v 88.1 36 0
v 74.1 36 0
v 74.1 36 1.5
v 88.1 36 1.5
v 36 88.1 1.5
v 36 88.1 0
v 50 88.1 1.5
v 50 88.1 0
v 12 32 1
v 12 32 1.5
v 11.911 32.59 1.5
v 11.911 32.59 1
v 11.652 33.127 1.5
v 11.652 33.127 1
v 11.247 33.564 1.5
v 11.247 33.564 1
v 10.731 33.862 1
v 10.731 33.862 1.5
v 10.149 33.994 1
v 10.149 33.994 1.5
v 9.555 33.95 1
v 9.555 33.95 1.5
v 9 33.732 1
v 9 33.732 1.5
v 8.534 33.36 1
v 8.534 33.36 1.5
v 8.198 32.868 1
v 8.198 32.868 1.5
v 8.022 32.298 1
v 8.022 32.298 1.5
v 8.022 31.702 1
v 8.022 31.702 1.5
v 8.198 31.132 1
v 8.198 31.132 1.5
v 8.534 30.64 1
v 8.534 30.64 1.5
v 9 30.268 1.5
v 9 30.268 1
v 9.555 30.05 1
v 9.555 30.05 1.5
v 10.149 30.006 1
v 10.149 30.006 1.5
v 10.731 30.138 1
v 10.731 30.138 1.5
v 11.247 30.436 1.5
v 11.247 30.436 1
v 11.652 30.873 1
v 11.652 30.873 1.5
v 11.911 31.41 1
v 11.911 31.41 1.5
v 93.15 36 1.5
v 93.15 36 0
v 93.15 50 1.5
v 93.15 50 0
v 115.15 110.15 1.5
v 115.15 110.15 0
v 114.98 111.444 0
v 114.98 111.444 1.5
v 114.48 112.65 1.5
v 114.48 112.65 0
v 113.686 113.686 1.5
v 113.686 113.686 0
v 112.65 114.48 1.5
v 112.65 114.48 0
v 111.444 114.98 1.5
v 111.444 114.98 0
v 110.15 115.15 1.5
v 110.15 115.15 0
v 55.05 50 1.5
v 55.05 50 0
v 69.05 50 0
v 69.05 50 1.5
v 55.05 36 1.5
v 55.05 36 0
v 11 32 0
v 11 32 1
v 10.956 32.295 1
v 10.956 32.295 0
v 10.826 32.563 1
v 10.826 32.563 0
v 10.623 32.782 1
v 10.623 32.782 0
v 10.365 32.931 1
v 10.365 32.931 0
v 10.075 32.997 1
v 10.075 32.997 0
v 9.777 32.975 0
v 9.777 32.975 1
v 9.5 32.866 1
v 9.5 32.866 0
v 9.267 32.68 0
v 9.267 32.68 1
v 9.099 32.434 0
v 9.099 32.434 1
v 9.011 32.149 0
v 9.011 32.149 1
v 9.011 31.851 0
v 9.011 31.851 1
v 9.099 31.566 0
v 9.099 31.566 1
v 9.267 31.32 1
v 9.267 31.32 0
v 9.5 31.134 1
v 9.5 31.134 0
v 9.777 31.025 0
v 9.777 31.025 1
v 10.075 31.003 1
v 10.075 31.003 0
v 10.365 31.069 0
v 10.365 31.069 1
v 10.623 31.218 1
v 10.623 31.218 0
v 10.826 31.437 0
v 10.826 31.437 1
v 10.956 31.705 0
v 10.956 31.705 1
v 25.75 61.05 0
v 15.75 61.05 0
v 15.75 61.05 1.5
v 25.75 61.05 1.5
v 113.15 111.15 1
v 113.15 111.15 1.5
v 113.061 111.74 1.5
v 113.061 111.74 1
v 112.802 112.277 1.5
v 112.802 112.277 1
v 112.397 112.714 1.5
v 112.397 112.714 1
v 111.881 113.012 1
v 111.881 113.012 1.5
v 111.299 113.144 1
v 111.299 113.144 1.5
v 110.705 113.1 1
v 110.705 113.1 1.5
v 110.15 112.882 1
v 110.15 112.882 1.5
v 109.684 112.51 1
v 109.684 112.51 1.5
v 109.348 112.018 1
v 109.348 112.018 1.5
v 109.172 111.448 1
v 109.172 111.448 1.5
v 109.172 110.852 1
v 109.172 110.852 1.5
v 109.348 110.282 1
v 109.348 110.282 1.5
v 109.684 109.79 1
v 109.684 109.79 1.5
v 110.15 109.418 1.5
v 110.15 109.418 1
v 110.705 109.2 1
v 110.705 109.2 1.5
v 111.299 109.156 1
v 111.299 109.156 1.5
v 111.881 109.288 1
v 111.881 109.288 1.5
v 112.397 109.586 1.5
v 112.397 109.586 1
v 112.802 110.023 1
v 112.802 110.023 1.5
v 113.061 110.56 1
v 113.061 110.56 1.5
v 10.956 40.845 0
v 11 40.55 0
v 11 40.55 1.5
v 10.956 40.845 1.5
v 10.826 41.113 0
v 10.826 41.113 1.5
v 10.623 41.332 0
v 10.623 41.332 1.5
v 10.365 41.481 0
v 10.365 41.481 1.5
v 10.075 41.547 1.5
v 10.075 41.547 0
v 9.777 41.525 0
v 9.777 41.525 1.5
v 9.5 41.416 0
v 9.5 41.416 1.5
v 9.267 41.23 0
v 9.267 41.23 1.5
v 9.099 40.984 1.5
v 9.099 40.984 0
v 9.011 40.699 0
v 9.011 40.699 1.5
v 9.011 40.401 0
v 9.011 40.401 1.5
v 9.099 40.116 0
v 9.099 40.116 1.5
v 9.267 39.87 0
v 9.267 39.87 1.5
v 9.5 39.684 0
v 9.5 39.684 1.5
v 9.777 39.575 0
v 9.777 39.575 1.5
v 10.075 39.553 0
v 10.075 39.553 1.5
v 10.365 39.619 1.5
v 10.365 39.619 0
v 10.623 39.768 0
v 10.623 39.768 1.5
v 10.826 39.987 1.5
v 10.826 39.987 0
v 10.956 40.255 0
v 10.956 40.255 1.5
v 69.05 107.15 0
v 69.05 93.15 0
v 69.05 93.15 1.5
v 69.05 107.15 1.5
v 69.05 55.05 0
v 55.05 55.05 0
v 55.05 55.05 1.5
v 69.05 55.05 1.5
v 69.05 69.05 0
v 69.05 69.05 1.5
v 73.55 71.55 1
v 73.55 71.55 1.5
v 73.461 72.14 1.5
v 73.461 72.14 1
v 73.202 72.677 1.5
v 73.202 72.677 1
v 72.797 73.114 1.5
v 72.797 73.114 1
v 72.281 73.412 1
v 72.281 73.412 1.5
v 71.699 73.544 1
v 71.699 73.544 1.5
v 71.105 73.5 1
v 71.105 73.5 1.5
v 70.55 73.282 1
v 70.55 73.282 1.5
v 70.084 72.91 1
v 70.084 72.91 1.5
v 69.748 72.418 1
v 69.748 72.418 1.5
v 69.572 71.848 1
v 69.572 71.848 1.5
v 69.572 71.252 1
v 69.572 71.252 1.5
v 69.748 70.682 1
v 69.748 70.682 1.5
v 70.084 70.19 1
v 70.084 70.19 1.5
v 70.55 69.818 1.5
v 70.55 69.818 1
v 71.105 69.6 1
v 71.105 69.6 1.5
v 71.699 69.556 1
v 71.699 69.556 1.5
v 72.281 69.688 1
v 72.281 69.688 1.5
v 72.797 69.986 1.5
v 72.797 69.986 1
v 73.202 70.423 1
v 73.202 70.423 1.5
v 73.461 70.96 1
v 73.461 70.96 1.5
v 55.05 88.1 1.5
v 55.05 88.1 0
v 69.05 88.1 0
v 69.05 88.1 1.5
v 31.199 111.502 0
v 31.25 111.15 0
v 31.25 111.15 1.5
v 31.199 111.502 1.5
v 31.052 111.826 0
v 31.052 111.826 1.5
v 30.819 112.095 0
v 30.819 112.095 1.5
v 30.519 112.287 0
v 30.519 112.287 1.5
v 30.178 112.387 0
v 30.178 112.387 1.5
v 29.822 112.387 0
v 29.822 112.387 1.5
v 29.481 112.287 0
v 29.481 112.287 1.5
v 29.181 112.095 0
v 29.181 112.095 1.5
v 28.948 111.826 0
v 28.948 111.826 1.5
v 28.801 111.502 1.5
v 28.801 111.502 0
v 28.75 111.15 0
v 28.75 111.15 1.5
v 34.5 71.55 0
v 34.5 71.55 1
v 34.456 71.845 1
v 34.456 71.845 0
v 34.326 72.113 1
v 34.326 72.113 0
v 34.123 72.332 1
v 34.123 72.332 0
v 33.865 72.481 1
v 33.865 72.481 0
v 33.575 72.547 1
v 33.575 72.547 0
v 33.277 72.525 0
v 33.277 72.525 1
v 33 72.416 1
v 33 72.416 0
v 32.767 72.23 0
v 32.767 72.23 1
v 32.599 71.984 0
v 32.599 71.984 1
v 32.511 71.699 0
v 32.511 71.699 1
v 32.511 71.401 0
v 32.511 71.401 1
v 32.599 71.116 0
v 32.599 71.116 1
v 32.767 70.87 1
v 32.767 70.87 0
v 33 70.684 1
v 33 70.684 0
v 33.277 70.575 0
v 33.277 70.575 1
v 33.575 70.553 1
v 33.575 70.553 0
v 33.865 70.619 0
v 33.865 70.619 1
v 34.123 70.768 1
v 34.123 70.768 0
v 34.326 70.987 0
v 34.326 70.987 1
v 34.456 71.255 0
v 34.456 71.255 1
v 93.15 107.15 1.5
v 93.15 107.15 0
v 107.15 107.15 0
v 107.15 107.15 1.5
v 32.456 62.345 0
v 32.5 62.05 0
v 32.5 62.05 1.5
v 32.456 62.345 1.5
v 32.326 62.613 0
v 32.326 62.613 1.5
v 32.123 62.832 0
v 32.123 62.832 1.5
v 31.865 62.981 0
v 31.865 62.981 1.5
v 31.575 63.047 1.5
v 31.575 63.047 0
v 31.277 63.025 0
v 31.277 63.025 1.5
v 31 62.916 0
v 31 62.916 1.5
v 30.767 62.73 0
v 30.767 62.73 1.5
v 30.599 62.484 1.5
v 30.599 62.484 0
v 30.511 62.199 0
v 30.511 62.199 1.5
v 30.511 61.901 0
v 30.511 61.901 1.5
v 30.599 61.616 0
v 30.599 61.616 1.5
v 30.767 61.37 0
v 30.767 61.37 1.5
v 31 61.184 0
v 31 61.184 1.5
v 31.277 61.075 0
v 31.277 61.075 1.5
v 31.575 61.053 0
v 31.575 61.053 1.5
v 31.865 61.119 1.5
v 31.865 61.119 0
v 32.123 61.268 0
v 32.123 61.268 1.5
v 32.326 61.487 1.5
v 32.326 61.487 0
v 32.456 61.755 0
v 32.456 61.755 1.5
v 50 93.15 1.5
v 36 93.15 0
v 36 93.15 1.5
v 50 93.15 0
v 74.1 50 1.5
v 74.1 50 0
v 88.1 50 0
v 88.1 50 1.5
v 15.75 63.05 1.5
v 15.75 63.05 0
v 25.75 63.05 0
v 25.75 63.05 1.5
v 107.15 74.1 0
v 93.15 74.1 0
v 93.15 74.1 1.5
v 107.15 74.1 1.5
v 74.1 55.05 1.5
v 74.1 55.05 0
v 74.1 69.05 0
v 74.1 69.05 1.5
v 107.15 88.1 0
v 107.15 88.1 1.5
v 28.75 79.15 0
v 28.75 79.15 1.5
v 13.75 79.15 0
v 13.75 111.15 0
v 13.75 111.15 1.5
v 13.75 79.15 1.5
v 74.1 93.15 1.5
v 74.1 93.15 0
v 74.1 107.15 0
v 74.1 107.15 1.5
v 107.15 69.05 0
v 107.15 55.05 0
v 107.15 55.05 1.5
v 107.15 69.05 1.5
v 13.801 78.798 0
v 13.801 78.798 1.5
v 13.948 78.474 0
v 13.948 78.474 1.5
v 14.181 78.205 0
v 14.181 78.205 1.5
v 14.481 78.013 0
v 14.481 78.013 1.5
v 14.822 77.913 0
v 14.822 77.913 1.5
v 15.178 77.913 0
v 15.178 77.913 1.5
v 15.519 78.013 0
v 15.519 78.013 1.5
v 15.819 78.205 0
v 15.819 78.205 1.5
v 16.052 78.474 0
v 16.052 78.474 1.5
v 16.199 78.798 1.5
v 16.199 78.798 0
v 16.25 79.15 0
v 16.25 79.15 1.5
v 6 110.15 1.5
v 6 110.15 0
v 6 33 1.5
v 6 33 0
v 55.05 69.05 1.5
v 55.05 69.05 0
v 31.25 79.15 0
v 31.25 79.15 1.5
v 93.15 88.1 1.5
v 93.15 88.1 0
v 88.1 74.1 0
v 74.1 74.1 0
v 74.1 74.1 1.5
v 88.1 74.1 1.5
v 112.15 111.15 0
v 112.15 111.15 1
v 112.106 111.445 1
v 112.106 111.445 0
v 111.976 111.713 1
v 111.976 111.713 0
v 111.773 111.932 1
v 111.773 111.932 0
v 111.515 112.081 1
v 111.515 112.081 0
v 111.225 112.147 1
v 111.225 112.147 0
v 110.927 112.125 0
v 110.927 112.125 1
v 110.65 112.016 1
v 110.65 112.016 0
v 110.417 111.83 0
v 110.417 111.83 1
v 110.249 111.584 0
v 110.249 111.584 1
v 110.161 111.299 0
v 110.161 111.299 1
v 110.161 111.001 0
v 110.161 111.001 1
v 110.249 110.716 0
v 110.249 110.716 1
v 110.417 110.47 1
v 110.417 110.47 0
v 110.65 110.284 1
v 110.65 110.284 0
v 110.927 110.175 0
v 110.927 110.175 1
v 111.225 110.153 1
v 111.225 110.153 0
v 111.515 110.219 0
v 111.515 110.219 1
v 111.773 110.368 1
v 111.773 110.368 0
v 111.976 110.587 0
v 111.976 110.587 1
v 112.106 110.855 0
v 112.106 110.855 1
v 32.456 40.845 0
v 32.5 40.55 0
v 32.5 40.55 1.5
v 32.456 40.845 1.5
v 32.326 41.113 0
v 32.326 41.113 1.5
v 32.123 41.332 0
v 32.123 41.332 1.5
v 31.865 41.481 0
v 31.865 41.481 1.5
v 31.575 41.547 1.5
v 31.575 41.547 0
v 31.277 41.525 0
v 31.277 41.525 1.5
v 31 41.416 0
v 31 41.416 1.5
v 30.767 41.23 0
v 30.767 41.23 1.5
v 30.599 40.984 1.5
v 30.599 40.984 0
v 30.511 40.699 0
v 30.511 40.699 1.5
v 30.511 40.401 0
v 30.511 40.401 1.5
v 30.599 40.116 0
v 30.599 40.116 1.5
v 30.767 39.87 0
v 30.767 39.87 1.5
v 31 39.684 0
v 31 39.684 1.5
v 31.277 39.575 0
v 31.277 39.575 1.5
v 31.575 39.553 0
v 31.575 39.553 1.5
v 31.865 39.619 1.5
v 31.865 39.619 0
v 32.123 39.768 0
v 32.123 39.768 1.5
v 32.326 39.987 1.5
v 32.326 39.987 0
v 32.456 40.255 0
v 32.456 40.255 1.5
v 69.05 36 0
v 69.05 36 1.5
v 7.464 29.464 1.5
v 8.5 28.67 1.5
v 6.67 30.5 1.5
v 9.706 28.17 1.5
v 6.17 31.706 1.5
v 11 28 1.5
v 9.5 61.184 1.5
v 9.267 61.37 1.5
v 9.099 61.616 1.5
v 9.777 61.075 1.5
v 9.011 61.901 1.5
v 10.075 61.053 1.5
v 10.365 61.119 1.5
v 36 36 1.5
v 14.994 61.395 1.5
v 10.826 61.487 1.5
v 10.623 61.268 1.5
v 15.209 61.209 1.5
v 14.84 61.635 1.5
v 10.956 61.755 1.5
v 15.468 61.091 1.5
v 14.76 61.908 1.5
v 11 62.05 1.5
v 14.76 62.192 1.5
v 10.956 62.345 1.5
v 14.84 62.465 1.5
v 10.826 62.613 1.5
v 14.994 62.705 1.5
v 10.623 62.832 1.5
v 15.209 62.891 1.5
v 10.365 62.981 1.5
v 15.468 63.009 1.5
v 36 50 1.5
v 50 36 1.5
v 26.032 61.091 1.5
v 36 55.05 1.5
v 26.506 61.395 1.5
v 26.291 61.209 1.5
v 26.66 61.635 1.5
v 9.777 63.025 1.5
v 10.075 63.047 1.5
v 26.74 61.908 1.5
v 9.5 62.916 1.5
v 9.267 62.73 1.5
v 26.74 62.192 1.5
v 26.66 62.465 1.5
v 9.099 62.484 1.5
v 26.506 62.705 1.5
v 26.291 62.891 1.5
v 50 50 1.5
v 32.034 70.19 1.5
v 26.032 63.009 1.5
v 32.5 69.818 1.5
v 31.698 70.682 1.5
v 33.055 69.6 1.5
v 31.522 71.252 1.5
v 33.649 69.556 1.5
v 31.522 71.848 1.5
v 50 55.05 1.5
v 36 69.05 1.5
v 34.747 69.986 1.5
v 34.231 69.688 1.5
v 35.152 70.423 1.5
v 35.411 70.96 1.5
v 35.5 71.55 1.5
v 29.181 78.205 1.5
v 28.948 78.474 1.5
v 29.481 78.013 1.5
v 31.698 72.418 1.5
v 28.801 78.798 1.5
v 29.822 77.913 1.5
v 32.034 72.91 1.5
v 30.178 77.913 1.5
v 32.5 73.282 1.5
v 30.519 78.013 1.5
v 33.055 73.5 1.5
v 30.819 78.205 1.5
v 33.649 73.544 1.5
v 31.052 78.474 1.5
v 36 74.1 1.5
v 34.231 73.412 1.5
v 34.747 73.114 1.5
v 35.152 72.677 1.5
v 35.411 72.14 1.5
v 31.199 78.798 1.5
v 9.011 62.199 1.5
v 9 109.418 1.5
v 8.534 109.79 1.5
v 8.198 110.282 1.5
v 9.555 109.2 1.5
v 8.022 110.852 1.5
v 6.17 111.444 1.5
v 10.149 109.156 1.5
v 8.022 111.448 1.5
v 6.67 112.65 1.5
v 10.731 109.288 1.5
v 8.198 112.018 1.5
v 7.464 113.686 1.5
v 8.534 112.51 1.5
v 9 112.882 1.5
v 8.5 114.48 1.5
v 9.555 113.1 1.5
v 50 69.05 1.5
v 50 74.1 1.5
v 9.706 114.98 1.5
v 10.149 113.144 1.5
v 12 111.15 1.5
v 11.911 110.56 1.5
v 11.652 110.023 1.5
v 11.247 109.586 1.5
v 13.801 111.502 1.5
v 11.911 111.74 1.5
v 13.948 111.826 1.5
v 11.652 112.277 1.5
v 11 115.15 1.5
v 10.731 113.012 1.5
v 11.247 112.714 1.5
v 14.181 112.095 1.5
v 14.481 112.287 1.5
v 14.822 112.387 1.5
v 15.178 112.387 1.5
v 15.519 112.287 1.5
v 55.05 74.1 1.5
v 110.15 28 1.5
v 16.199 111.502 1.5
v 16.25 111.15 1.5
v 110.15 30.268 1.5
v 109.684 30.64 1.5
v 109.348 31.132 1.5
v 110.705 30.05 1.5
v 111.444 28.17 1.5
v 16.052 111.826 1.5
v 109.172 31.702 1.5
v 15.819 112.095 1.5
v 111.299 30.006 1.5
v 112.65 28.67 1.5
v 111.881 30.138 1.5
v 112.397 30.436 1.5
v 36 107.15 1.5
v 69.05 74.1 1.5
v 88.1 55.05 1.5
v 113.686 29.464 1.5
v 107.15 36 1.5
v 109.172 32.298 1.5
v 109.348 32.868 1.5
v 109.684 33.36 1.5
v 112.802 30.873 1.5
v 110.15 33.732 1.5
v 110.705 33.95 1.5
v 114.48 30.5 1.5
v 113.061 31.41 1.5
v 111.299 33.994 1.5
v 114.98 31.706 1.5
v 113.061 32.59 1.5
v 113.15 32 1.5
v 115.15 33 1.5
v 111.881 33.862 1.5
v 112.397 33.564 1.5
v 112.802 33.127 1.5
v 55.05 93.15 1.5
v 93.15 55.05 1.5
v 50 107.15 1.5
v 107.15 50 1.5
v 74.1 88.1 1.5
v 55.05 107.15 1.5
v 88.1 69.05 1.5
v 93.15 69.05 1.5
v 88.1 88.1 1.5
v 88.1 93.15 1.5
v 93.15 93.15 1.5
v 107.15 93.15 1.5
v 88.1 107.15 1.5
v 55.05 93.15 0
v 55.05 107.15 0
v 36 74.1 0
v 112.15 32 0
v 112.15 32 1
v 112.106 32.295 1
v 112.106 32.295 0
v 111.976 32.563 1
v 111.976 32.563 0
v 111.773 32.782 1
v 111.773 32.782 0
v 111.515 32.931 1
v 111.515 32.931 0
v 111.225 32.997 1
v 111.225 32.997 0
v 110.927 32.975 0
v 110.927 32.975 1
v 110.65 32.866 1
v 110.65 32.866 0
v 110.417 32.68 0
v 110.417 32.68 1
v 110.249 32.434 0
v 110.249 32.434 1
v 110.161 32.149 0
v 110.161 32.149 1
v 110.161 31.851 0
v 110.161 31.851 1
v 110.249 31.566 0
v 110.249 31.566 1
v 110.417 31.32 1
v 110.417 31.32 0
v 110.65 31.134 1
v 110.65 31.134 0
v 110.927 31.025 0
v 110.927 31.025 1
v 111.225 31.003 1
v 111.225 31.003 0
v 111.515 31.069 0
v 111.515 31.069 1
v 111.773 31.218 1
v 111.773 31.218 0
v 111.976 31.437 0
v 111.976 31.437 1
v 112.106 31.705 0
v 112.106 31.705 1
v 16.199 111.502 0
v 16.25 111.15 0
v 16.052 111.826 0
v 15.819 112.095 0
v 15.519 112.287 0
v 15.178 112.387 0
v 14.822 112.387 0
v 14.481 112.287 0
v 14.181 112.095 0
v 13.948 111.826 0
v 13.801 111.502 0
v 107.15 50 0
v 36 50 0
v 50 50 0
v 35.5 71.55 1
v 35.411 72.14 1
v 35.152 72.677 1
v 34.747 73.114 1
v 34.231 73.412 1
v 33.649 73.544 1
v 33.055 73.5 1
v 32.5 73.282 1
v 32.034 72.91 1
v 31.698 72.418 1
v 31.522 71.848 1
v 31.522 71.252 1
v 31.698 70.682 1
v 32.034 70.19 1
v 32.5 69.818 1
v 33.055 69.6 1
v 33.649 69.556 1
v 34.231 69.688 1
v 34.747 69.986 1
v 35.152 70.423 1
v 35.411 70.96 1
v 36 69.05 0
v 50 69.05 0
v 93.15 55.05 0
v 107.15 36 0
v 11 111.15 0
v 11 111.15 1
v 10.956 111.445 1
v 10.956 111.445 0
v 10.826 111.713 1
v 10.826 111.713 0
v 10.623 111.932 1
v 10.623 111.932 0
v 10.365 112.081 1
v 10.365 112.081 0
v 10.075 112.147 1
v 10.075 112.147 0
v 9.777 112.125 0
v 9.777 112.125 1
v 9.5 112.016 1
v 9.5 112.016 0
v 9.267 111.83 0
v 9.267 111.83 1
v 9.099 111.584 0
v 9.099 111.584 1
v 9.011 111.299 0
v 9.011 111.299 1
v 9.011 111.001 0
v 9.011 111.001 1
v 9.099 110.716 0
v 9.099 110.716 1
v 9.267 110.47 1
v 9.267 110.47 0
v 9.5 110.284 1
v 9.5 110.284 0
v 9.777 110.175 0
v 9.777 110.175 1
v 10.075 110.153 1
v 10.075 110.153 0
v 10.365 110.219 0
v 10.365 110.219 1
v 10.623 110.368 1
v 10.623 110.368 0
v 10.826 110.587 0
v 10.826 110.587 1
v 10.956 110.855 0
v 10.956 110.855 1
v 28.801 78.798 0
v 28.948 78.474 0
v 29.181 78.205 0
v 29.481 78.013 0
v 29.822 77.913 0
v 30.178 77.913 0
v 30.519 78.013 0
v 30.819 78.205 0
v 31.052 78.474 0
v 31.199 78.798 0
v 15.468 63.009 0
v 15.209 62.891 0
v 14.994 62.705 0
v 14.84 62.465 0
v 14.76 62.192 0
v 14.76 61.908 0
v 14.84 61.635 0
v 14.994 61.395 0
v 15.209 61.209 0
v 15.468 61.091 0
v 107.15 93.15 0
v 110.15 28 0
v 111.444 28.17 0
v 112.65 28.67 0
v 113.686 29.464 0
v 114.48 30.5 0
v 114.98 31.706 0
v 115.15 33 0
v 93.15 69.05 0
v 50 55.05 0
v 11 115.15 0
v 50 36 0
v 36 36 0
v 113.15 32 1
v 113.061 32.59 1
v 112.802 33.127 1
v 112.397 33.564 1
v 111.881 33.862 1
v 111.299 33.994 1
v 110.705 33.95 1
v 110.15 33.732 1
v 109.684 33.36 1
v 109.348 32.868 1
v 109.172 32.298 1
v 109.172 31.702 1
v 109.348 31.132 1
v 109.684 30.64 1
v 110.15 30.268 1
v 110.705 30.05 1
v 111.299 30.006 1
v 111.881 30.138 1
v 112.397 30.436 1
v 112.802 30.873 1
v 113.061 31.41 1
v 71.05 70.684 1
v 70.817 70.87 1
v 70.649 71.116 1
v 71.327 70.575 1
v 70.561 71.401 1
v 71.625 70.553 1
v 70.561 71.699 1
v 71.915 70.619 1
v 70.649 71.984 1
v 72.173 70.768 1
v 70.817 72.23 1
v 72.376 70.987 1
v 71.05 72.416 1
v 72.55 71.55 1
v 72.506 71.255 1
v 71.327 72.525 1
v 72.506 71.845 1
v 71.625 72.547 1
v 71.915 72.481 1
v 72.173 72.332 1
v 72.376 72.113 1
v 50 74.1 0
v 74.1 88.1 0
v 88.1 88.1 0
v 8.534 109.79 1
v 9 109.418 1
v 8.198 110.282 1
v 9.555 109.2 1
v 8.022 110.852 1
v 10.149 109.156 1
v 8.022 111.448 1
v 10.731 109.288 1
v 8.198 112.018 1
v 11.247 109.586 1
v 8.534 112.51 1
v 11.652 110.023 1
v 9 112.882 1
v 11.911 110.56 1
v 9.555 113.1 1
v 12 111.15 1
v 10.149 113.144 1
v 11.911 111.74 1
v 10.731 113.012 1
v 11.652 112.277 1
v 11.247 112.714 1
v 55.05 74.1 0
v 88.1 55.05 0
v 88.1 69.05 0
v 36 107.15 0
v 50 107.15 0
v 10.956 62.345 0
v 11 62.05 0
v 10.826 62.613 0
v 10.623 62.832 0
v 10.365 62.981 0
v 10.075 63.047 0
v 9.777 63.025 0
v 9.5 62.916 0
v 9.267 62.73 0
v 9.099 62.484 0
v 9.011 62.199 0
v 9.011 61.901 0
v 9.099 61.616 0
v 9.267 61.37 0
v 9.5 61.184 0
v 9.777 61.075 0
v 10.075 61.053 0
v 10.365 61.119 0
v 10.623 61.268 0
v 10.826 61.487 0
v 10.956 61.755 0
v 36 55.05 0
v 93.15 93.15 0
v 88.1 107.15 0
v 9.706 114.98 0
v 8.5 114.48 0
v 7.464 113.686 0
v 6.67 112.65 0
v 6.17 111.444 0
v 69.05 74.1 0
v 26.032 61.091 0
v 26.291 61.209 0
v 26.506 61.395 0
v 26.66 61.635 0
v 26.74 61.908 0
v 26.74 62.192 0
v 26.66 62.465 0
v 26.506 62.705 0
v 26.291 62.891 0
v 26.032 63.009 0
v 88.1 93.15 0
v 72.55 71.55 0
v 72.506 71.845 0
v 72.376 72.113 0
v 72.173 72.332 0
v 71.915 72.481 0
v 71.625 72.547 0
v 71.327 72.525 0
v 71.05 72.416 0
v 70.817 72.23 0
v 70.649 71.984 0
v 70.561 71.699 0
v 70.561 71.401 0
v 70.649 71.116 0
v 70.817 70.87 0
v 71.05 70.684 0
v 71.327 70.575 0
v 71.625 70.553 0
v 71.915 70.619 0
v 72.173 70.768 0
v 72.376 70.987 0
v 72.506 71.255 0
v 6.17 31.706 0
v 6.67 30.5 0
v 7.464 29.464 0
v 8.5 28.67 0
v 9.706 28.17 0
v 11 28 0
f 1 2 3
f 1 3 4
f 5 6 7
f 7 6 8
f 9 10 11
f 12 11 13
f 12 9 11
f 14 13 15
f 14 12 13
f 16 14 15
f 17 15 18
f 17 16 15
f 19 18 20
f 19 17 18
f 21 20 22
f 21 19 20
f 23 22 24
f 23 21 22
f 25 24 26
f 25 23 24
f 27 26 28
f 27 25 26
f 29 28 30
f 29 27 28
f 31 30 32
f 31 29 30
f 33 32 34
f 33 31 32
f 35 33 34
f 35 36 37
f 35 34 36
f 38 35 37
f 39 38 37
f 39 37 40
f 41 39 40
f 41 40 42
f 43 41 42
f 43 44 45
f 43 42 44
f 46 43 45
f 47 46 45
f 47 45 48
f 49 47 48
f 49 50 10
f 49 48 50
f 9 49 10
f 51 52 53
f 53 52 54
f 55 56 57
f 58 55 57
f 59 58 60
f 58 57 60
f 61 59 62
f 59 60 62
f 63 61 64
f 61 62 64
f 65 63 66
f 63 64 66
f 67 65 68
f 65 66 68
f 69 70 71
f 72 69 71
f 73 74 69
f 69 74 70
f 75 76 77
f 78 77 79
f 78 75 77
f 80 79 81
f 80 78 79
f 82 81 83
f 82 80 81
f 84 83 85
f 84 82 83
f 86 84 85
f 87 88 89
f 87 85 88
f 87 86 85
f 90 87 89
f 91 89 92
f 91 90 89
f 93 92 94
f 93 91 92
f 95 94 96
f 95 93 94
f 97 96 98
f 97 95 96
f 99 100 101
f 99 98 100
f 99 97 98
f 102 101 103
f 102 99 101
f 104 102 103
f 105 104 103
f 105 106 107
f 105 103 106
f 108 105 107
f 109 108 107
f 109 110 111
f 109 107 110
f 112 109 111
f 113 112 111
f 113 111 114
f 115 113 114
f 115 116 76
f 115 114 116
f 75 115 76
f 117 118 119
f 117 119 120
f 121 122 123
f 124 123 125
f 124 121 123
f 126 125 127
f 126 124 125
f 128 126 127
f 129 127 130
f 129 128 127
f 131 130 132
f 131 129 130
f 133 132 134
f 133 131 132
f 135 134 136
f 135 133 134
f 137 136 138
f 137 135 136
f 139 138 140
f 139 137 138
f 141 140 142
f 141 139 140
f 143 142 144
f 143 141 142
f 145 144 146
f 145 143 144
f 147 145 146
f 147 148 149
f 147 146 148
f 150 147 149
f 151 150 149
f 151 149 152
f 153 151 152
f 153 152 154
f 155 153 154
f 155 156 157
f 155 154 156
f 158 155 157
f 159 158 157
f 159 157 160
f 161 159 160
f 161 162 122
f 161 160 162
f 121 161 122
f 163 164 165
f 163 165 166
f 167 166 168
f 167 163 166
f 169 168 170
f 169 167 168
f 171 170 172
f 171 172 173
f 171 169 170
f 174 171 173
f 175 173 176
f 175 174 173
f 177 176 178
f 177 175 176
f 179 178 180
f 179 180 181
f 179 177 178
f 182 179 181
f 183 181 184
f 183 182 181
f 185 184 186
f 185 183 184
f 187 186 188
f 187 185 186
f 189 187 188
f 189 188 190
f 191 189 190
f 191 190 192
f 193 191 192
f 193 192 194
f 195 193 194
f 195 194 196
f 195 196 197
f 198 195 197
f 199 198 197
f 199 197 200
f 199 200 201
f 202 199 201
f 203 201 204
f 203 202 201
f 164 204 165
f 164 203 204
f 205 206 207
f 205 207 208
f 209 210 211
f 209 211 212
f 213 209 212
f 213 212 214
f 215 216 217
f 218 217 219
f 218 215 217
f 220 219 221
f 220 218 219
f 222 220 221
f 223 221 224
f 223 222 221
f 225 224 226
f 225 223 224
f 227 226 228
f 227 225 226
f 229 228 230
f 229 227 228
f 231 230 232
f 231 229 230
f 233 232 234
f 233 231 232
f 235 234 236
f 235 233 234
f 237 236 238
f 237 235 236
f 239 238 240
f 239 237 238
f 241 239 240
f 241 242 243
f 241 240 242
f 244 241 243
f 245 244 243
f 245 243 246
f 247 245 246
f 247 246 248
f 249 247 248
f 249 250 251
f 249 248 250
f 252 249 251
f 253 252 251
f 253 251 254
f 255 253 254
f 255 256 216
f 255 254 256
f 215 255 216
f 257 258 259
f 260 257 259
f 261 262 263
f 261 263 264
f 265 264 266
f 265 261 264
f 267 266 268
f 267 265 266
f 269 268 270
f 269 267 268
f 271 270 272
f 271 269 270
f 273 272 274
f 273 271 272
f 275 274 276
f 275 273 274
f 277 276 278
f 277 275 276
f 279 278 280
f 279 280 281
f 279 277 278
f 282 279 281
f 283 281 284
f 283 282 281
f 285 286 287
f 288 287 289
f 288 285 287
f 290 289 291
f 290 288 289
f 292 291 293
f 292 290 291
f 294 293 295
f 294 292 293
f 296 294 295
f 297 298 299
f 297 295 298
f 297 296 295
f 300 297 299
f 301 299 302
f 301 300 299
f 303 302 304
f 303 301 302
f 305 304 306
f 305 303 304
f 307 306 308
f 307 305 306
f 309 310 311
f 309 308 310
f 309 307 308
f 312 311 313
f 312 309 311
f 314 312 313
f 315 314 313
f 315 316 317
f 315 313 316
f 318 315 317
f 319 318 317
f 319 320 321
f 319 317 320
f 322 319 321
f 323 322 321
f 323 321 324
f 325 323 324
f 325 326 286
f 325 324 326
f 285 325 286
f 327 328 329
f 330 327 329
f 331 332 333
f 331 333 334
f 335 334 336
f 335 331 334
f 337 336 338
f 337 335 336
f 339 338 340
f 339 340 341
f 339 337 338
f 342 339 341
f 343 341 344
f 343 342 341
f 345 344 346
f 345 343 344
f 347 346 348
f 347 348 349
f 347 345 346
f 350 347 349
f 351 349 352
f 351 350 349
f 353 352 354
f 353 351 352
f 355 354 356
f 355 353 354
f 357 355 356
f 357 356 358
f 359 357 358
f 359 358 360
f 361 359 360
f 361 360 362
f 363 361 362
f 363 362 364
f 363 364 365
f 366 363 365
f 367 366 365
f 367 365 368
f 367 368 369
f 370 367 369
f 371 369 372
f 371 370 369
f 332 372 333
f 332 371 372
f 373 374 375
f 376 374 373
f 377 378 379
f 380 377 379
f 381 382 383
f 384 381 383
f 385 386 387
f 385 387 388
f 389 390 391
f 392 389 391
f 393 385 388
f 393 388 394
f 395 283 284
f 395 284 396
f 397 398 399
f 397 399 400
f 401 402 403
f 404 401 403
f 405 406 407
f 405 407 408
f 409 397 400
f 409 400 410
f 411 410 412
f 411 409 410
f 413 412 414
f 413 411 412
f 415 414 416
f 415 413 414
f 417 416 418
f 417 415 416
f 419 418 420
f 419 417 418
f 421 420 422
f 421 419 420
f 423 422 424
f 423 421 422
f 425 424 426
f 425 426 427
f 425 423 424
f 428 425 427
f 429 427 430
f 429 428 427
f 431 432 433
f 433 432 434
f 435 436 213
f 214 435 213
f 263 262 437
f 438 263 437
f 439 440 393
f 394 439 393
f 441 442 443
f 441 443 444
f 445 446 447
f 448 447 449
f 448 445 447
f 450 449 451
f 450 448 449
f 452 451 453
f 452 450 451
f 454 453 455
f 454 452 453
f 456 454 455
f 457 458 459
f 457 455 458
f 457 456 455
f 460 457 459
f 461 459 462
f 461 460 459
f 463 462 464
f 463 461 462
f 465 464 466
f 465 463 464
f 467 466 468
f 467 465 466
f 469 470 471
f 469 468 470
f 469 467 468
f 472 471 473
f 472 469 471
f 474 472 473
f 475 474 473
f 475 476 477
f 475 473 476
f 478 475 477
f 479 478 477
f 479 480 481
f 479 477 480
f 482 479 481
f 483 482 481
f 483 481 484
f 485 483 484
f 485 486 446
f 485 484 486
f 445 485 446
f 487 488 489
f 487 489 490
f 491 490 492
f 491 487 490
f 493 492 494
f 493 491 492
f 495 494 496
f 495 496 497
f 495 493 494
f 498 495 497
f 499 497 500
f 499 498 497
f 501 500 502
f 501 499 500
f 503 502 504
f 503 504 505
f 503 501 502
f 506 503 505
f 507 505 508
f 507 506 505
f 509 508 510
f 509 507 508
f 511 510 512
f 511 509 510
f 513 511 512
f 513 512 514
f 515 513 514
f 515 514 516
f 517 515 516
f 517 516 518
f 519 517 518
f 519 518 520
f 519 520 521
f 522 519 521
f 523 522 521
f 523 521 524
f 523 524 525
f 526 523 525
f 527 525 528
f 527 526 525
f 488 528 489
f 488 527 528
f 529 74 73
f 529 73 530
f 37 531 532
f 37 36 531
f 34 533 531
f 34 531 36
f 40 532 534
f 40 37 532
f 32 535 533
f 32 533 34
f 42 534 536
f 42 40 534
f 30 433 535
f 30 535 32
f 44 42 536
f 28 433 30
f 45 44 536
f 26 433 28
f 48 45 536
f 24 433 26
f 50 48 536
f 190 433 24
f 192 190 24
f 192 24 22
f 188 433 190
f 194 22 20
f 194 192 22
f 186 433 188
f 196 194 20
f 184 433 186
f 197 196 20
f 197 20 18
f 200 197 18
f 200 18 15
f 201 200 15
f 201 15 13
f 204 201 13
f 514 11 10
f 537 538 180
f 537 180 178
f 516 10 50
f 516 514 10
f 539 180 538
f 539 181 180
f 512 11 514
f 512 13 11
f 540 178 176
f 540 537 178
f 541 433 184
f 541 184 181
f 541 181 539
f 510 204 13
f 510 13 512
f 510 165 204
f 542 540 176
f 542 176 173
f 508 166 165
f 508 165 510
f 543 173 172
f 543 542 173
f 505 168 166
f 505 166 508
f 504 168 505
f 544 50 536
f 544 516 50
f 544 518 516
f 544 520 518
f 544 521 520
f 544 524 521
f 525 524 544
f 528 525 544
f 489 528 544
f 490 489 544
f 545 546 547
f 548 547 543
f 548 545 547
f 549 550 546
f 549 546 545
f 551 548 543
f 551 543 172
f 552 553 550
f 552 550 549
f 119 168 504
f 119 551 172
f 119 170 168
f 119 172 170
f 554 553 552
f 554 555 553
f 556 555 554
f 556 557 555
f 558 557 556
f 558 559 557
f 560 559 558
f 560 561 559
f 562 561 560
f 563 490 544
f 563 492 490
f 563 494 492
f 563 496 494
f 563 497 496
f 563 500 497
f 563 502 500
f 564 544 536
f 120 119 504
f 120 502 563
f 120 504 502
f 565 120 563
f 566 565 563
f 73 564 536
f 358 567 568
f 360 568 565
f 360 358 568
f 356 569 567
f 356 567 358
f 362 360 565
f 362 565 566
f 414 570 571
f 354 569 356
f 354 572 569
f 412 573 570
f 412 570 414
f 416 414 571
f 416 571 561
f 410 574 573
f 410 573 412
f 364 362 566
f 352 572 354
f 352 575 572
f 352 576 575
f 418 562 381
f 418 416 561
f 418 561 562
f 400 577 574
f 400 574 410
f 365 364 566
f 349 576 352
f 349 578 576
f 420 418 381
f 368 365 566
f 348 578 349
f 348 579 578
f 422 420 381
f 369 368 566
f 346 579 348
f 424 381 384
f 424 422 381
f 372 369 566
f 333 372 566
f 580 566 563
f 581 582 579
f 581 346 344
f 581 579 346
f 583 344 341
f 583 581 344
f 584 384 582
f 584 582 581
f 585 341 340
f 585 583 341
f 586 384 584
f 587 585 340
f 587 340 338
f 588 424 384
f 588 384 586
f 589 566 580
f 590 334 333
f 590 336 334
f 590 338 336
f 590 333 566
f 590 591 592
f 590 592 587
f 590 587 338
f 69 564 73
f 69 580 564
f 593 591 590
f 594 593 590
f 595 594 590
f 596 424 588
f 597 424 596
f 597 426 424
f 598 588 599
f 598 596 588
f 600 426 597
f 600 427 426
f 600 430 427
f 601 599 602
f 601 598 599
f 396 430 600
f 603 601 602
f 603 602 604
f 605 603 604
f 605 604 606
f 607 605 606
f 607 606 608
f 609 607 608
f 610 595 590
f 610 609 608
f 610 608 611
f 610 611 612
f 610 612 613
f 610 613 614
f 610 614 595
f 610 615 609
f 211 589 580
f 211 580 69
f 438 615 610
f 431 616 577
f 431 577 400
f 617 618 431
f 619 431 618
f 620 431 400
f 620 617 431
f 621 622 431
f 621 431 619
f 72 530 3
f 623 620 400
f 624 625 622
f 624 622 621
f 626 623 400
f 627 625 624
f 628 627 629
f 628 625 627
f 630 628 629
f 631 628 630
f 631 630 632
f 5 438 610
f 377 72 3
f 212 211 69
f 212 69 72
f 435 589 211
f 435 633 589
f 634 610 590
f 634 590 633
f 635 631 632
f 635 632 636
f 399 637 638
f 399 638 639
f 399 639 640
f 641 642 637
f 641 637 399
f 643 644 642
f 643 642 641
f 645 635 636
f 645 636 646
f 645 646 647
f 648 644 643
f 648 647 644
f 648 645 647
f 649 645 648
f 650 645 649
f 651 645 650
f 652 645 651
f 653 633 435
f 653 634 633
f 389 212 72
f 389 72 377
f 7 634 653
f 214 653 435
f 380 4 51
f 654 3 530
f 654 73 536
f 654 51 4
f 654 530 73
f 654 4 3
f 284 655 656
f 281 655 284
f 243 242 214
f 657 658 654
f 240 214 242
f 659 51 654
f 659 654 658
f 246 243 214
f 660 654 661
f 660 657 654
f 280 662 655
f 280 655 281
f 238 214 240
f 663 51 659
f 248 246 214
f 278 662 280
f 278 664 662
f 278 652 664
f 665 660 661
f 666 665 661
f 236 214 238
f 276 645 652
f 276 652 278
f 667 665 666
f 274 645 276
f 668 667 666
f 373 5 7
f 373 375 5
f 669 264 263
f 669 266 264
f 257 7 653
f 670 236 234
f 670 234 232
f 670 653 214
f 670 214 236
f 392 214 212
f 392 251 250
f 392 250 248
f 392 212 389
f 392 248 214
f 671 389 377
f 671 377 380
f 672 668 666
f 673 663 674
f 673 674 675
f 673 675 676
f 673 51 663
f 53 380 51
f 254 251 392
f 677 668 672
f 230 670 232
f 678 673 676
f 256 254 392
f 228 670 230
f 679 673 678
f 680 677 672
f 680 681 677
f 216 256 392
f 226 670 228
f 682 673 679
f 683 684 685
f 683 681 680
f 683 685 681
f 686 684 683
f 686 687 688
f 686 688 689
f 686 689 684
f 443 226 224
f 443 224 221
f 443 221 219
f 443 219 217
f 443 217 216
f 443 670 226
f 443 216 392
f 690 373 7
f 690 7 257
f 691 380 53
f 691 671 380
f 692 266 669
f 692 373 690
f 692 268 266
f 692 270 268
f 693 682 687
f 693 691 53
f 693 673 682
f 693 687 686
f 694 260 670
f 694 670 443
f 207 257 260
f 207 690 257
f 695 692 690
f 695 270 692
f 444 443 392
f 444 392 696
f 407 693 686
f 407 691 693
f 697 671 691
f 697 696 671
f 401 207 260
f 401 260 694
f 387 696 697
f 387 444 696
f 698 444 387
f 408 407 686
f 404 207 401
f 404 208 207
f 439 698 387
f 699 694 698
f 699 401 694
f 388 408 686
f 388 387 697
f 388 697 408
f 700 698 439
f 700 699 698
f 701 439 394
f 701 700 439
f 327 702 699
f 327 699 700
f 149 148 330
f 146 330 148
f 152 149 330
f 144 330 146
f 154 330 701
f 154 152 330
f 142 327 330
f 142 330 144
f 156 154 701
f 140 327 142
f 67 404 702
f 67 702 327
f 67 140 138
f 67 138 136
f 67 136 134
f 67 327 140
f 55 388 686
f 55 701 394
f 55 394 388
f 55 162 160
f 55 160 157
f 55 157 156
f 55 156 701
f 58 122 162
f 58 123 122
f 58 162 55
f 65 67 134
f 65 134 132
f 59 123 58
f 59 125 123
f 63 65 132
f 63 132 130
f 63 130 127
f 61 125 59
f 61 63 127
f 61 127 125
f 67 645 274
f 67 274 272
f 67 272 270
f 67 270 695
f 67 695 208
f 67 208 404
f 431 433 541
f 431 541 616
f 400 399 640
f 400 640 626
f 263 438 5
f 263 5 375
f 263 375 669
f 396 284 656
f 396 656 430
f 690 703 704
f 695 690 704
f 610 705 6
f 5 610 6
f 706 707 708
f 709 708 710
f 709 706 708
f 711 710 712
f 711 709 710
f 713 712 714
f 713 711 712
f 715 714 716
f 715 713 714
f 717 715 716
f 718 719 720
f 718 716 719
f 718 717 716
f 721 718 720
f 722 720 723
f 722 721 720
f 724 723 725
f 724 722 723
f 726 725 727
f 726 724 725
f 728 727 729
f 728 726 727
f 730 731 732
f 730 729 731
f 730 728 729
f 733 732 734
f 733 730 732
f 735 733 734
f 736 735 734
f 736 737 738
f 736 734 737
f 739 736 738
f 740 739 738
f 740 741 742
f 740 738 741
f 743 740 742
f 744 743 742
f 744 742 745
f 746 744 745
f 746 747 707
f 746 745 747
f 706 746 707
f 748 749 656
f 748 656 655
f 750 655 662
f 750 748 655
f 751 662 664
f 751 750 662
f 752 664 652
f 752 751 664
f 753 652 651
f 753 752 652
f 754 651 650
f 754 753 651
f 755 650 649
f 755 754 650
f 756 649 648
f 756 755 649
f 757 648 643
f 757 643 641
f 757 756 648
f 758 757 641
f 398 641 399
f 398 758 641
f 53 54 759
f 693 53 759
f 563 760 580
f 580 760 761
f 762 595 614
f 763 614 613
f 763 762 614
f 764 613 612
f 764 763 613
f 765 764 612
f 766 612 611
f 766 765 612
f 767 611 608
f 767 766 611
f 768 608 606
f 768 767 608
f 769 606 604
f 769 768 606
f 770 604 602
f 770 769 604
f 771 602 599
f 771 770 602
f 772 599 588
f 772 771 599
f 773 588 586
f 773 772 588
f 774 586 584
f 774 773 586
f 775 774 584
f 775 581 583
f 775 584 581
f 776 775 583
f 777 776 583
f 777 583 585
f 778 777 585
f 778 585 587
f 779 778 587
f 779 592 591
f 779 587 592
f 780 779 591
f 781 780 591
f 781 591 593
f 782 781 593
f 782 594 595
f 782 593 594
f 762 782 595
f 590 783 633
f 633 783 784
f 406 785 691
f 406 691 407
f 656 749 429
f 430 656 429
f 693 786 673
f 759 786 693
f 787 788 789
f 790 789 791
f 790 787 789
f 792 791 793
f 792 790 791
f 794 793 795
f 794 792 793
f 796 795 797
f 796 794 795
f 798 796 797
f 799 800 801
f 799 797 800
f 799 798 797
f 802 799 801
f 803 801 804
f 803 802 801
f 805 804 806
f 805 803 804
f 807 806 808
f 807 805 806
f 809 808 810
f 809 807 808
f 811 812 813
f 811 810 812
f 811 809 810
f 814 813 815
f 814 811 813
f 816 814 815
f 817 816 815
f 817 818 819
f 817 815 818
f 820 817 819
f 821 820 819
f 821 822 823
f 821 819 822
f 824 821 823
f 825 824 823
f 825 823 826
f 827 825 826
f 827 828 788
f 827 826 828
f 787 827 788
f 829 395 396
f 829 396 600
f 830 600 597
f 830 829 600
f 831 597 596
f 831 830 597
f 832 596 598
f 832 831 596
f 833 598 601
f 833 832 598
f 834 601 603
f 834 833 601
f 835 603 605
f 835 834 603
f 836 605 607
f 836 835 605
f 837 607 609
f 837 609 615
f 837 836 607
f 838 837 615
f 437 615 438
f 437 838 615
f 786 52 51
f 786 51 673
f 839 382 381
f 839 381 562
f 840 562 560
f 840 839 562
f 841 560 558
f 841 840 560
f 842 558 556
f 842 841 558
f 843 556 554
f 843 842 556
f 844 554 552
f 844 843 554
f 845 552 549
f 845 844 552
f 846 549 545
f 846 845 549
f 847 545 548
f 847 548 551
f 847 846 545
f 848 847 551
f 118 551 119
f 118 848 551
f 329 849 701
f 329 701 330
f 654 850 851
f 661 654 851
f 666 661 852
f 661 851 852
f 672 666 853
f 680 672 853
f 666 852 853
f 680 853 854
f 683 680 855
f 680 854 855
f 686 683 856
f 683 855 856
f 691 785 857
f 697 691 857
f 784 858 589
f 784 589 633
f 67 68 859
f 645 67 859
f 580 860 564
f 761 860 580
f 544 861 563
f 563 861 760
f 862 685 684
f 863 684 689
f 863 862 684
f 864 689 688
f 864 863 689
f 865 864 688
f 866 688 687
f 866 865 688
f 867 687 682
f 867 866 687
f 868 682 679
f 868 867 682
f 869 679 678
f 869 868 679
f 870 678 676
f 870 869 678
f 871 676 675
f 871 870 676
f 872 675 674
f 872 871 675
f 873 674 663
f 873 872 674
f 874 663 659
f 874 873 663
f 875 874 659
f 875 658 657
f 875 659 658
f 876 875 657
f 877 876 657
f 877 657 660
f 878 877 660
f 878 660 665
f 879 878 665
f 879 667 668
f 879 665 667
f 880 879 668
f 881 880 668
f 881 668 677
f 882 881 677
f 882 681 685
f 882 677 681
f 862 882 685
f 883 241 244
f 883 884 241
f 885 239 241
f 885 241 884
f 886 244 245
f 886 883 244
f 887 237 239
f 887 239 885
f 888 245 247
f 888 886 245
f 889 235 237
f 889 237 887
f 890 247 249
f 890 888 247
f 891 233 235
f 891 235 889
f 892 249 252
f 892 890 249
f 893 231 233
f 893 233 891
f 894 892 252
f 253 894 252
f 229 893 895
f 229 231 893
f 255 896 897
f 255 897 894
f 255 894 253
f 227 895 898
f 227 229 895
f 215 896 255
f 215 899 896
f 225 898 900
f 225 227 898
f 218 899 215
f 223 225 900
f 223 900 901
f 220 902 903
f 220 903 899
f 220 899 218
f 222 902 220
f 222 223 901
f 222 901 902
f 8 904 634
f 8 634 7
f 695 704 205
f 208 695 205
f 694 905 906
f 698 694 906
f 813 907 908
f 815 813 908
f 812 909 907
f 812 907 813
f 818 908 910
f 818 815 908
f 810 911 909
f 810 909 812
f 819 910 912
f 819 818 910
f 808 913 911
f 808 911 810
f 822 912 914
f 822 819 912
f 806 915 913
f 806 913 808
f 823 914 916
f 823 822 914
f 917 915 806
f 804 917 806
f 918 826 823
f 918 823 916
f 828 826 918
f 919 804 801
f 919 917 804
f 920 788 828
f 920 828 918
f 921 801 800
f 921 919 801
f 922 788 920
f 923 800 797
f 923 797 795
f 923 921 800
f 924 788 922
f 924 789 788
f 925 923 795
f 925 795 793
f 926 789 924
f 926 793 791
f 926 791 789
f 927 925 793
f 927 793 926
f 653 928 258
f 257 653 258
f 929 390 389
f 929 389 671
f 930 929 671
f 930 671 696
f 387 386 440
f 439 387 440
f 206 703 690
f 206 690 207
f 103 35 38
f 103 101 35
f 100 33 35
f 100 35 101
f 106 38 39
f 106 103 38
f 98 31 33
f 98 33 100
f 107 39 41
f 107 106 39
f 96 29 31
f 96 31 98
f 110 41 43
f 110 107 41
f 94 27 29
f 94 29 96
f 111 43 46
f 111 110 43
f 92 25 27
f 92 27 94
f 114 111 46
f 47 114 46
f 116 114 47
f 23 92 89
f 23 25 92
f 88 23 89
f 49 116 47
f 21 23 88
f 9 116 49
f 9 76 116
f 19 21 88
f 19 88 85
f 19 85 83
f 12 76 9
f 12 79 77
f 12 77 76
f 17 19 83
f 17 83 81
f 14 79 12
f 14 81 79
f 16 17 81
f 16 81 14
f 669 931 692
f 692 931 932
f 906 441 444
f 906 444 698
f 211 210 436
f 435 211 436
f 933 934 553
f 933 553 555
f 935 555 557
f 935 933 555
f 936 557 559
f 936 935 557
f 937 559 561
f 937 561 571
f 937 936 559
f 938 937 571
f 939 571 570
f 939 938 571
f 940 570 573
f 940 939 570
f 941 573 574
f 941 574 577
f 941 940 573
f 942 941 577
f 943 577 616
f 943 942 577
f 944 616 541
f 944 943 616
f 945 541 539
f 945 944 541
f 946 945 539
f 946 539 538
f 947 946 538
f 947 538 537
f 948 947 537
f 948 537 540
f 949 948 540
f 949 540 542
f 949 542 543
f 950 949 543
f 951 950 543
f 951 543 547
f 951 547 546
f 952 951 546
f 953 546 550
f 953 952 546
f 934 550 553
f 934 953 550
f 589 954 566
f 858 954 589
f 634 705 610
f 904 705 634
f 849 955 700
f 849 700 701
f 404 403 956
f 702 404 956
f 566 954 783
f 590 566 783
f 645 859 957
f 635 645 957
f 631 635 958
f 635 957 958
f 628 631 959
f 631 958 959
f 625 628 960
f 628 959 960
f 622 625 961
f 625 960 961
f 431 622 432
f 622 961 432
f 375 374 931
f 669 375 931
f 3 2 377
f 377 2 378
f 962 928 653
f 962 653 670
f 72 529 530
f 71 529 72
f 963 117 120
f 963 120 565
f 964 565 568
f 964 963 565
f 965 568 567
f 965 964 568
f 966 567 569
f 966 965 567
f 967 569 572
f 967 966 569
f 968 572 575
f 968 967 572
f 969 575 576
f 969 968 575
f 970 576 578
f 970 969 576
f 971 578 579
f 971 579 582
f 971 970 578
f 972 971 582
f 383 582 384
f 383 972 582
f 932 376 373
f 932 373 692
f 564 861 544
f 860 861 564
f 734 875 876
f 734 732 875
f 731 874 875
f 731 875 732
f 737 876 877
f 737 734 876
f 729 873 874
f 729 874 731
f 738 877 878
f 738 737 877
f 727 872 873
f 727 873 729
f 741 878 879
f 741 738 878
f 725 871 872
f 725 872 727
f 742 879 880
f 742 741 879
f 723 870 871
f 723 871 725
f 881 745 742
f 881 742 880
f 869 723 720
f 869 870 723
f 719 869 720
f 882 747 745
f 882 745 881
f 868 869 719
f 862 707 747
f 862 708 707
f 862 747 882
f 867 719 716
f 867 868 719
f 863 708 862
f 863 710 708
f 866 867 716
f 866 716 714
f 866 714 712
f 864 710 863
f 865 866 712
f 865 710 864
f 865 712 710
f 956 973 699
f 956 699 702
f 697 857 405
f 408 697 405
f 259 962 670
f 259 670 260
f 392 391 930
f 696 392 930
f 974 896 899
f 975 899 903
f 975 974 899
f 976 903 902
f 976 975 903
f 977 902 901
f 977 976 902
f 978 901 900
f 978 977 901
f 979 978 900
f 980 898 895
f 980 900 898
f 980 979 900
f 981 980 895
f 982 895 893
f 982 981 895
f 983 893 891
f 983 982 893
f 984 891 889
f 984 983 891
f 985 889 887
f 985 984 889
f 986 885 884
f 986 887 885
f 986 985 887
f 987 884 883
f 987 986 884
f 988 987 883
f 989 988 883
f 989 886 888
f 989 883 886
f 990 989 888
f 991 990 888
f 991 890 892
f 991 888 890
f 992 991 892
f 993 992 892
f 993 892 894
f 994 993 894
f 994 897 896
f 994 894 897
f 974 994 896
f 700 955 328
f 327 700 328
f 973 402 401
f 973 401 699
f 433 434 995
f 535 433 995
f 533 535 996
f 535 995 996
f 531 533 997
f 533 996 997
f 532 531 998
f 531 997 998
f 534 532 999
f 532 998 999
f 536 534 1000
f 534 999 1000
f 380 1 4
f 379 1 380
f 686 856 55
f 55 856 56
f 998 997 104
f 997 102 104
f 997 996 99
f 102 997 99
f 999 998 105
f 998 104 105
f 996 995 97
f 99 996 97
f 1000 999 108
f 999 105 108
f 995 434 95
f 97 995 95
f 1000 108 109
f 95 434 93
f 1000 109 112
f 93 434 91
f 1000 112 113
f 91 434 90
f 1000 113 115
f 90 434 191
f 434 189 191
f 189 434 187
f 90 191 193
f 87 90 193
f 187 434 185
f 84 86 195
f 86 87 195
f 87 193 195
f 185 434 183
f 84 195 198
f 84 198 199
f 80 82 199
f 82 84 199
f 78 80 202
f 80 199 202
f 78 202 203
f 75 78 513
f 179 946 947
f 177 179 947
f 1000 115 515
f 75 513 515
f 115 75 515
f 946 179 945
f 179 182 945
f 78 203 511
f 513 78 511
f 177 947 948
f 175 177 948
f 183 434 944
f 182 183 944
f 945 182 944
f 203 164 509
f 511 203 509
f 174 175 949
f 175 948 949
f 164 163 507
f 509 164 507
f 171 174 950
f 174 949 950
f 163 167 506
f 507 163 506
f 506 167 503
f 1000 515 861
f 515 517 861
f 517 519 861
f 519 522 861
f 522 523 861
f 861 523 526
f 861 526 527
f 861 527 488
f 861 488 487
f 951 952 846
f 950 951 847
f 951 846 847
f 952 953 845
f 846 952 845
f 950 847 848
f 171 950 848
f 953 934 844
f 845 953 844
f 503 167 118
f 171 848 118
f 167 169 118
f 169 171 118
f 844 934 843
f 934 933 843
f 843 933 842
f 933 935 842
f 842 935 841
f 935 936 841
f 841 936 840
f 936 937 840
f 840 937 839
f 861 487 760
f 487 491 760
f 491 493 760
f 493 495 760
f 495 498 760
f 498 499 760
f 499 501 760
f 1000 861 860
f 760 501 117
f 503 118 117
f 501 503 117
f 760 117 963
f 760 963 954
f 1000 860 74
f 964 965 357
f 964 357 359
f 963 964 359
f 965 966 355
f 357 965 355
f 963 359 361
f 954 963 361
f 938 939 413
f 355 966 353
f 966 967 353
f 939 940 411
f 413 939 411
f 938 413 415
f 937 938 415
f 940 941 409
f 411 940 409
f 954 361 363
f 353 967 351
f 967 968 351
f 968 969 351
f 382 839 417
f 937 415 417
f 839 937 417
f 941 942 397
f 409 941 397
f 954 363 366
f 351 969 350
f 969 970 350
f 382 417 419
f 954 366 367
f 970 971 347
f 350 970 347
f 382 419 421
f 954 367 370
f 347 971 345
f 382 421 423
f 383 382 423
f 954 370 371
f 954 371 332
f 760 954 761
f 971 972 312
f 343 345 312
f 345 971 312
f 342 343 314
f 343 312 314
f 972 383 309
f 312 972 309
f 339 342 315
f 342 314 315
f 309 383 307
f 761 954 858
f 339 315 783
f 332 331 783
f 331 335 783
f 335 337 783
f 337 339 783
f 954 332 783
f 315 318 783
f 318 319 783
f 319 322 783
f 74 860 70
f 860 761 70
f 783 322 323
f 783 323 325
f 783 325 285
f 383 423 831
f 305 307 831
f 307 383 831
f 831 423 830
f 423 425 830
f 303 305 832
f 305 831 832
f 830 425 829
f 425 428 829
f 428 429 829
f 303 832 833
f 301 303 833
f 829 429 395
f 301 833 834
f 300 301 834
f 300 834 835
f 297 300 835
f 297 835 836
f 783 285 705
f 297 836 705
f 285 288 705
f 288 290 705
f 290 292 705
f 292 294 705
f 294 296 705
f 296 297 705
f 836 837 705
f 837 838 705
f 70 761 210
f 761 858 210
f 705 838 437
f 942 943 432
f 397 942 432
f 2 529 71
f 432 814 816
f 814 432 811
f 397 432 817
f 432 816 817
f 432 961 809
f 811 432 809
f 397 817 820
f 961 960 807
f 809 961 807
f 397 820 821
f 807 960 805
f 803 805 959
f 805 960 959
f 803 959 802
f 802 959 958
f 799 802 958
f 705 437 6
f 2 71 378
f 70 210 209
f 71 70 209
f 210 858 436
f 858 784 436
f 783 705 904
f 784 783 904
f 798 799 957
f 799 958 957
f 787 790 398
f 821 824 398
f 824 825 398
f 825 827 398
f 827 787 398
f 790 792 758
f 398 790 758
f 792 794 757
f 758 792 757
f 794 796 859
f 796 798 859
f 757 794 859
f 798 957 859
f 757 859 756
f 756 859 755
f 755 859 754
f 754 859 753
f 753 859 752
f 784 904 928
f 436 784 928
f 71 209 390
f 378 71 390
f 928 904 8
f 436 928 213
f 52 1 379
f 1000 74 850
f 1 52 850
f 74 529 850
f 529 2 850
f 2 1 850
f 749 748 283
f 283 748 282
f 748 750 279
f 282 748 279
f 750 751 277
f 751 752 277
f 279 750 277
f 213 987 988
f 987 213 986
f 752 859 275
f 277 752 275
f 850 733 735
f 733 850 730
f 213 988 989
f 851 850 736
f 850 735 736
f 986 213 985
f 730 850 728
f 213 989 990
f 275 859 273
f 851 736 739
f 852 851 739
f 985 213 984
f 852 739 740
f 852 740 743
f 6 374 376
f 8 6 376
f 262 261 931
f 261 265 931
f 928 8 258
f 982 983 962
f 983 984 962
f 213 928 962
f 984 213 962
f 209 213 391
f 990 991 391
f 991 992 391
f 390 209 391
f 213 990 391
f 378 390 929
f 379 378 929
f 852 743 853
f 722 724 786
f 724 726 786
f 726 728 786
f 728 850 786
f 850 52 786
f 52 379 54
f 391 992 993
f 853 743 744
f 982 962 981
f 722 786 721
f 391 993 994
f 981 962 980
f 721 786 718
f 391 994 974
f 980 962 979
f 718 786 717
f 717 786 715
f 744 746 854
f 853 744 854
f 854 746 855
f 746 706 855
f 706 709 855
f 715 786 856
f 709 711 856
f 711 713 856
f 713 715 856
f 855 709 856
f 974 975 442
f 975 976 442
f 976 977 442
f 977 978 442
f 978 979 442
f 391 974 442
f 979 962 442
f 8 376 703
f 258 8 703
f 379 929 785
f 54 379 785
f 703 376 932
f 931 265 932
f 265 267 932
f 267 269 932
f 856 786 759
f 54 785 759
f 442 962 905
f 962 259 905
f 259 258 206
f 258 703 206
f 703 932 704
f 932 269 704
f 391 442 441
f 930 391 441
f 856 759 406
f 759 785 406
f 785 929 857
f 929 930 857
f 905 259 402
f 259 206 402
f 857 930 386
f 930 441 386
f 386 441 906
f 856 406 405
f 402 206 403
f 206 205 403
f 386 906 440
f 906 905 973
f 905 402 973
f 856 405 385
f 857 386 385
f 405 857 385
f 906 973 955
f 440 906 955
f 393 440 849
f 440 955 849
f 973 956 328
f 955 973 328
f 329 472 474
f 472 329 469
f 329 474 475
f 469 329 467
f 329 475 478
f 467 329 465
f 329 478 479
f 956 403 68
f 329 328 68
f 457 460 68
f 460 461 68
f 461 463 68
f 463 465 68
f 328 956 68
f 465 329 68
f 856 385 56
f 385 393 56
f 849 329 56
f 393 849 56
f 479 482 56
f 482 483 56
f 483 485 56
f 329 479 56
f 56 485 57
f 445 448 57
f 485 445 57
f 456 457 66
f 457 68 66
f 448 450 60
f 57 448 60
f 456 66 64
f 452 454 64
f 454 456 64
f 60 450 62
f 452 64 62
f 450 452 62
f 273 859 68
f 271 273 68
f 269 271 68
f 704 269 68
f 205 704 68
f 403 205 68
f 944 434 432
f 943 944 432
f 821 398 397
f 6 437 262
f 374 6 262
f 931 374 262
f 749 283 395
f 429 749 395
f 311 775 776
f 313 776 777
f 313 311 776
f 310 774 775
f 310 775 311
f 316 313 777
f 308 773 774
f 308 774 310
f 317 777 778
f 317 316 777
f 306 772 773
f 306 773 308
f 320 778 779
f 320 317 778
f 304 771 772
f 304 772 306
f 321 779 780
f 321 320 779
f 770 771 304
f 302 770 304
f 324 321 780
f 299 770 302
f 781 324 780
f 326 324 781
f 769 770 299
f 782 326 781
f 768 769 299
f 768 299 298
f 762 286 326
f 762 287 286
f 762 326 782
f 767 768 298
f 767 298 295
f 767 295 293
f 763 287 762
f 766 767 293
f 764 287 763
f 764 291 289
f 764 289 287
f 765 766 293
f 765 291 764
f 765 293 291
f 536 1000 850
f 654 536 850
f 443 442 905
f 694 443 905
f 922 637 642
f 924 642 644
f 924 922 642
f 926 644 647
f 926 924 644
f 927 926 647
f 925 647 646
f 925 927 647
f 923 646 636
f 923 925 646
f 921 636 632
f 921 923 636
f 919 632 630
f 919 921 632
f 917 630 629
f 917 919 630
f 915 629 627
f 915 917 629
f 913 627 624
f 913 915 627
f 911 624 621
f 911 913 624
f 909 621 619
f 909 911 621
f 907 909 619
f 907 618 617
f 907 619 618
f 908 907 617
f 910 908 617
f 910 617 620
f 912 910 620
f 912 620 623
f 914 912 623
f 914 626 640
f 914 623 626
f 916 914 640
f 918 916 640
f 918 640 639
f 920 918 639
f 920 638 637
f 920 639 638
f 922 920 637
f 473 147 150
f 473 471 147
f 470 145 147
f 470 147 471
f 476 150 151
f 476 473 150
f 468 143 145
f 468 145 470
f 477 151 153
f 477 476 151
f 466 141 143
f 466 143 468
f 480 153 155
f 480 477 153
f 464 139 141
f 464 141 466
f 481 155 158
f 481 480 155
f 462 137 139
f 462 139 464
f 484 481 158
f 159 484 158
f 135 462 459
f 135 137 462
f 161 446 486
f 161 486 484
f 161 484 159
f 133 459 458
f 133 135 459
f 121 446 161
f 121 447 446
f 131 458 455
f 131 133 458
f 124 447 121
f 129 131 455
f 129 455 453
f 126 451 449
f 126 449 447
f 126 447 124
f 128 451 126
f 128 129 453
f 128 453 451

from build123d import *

# Parameters (mm, degrees)
SKETCH_R     = 1
SKETCH_W     = 14
SKETCH_H     = 14
PAD_DEPTH    = 1.5
POCKET_START = 1
SKETCH001_R  = 2
POCKET_DEPTH = 14


with BuildPart() as part:
    # Sketch → Pad (new body)
    with BuildSketch(Plane.XY):
        with BuildLine():
            Line((115.15, 33), (115.15, 110.15))
            ThreePointArc((115.15, 110.15), (113.685534, 113.685534), (110.15, 115.15))
            Line((110.15, 115.15), (11, 115.15))
            ThreePointArc((11, 115.15), (7.464466, 113.685534), (6, 110.15))
            Line((6, 110.15), (6, 33))
            ThreePointArc((6, 33), (7.464466, 29.464466), (11, 28))
            Line((11, 28), (110.15, 28))
            ThreePointArc((110.15, 28), (113.685534, 29.464466), (115.15, 33))
        make_face()
        with Locations((10, 111.15)):
            Circle(SKETCH_R, mode=Mode.SUBTRACT)
        with Locations((10, 32)):
            Circle(SKETCH_R, mode=Mode.SUBTRACT)
        with Locations((111.15, 32)):
            Circle(SKETCH_R, mode=Mode.SUBTRACT)
        with Locations((111.15, 111.15)):
            Circle(SKETCH_R, mode=Mode.SUBTRACT)
        with Locations((71.55, 71.55)):
            Circle(SKETCH_R, mode=Mode.SUBTRACT)
        with Locations((33.5, 71.55)):
            Circle(SKETCH_R, mode=Mode.SUBTRACT)
        with Locations((31.5, 62.05)):
            Circle(SKETCH_R, mode=Mode.SUBTRACT)
        with Locations((10, 62.05)):
            Circle(SKETCH_R, mode=Mode.SUBTRACT)
        with Locations((10, 40.55)):
            Circle(SKETCH_R, mode=Mode.SUBTRACT)
        with Locations((31.5, 40.55)):
            Circle(SKETCH_R, mode=Mode.SUBTRACT)
        with Locations((43, 43)):
            Rectangle(SKETCH_W, SKETCH_H, mode=Mode.SUBTRACT)
        with Locations((62.05, 43)):
            Rectangle(SKETCH_W, SKETCH_H, mode=Mode.SUBTRACT)
        with Locations((81.1, 43)):
            Rectangle(SKETCH_W, SKETCH_H, mode=Mode.SUBTRACT)
        with Locations((100.15, 43)):
            Rectangle(SKETCH_W, SKETCH_H, mode=Mode.SUBTRACT)
        with Locations((43, 62.05)):
            Rectangle(SKETCH_W, SKETCH_H, mode=Mode.SUBTRACT)
        with Locations((62.05, 62.05)):
            Rectangle(SKETCH_W, SKETCH_H, mode=Mode.SUBTRACT)
        with Locations((81.1, 62.05)):
            Rectangle(SKETCH_W, SKETCH_H, mode=Mode.SUBTRACT)
        with Locations((100.15, 62.05)):
            Rectangle(SKETCH_W, SKETCH_H, mode=Mode.SUBTRACT)
        with Locations((43, 81.1)):
            Rectangle(SKETCH_W, SKETCH_H, mode=Mode.SUBTRACT)
        with Locations((62.05, 81.1)):
            Rectangle(SKETCH_W, SKETCH_H, mode=Mode.SUBTRACT)
        with Locations((81.1, 81.1)):
            Rectangle(SKETCH_W, SKETCH_H, mode=Mode.SUBTRACT)
        with Locations((100.15, 81.1)):
            Rectangle(SKETCH_W, SKETCH_H, mode=Mode.SUBTRACT)
        with Locations((43, 100.15)):
            Rectangle(SKETCH_W, SKETCH_H, mode=Mode.SUBTRACT)
        with Locations((62.05, 100.15)):
            Rectangle(SKETCH_W, SKETCH_H, mode=Mode.SUBTRACT)
        with Locations((81.1, 100.15)):
            Rectangle(SKETCH_W, SKETCH_H, mode=Mode.SUBTRACT)
        with Locations((100.15, 100.15)):
            Rectangle(SKETCH_W, SKETCH_H, mode=Mode.SUBTRACT)
        with BuildLine():
            ThreePointArc((16.25, 111.15), (15, 112.4), (13.75, 111.15))
            Line((13.75, 111.15), (13.75, 79.15))
            ThreePointArc((13.75, 79.15), (15, 77.9), (16.25, 79.15))
            Line((16.25, 111.15), (16.25, 79.15))
        make_face(mode=Mode.SUBTRACT)
        with BuildLine():
            ThreePointArc((31.25, 111.15), (30, 112.4), (28.75, 111.15))
            Line((28.75, 111.15), (28.75, 79.15))
            ThreePointArc((28.75, 79.15), (30, 77.9), (31.25, 79.15))
            Line((31.25, 111.15), (31.25, 79.15))
        make_face(mode=Mode.SUBTRACT)
        with BuildLine():
            ThreePointArc((15.75, 63.05), (14.75, 62.05), (15.75, 61.05))
            Line((15.75, 61.05), (25.75, 61.05))
            ThreePointArc((25.75, 61.05), (26.75, 62.05), (25.75, 63.05))
            Line((15.75, 63.05), (25.75, 63.05))
        make_face(mode=Mode.SUBTRACT)
    extrude(amount=PAD_DEPTH)

    # Sketch001 → Pocket (cut)
    with BuildSketch(Plane.XY.offset(POCKET_START)):
        with Locations((10, 111.15)):
            Circle(SKETCH001_R)
        with Locations((10, 32)):
            Circle(SKETCH001_R)
        with Locations((111.15, 32)):
            Circle(SKETCH001_R)
        with Locations((111.15, 111.15)):
            Circle(SKETCH001_R)
        with Locations((71.55, 71.55)):
            Circle(SKETCH001_R)
        with Locations((33.5, 71.55)):
            Circle(SKETCH001_R)
    extrude(amount=POCKET_DEPTH, mode=Mode.SUBTRACT)


solid = part.part
